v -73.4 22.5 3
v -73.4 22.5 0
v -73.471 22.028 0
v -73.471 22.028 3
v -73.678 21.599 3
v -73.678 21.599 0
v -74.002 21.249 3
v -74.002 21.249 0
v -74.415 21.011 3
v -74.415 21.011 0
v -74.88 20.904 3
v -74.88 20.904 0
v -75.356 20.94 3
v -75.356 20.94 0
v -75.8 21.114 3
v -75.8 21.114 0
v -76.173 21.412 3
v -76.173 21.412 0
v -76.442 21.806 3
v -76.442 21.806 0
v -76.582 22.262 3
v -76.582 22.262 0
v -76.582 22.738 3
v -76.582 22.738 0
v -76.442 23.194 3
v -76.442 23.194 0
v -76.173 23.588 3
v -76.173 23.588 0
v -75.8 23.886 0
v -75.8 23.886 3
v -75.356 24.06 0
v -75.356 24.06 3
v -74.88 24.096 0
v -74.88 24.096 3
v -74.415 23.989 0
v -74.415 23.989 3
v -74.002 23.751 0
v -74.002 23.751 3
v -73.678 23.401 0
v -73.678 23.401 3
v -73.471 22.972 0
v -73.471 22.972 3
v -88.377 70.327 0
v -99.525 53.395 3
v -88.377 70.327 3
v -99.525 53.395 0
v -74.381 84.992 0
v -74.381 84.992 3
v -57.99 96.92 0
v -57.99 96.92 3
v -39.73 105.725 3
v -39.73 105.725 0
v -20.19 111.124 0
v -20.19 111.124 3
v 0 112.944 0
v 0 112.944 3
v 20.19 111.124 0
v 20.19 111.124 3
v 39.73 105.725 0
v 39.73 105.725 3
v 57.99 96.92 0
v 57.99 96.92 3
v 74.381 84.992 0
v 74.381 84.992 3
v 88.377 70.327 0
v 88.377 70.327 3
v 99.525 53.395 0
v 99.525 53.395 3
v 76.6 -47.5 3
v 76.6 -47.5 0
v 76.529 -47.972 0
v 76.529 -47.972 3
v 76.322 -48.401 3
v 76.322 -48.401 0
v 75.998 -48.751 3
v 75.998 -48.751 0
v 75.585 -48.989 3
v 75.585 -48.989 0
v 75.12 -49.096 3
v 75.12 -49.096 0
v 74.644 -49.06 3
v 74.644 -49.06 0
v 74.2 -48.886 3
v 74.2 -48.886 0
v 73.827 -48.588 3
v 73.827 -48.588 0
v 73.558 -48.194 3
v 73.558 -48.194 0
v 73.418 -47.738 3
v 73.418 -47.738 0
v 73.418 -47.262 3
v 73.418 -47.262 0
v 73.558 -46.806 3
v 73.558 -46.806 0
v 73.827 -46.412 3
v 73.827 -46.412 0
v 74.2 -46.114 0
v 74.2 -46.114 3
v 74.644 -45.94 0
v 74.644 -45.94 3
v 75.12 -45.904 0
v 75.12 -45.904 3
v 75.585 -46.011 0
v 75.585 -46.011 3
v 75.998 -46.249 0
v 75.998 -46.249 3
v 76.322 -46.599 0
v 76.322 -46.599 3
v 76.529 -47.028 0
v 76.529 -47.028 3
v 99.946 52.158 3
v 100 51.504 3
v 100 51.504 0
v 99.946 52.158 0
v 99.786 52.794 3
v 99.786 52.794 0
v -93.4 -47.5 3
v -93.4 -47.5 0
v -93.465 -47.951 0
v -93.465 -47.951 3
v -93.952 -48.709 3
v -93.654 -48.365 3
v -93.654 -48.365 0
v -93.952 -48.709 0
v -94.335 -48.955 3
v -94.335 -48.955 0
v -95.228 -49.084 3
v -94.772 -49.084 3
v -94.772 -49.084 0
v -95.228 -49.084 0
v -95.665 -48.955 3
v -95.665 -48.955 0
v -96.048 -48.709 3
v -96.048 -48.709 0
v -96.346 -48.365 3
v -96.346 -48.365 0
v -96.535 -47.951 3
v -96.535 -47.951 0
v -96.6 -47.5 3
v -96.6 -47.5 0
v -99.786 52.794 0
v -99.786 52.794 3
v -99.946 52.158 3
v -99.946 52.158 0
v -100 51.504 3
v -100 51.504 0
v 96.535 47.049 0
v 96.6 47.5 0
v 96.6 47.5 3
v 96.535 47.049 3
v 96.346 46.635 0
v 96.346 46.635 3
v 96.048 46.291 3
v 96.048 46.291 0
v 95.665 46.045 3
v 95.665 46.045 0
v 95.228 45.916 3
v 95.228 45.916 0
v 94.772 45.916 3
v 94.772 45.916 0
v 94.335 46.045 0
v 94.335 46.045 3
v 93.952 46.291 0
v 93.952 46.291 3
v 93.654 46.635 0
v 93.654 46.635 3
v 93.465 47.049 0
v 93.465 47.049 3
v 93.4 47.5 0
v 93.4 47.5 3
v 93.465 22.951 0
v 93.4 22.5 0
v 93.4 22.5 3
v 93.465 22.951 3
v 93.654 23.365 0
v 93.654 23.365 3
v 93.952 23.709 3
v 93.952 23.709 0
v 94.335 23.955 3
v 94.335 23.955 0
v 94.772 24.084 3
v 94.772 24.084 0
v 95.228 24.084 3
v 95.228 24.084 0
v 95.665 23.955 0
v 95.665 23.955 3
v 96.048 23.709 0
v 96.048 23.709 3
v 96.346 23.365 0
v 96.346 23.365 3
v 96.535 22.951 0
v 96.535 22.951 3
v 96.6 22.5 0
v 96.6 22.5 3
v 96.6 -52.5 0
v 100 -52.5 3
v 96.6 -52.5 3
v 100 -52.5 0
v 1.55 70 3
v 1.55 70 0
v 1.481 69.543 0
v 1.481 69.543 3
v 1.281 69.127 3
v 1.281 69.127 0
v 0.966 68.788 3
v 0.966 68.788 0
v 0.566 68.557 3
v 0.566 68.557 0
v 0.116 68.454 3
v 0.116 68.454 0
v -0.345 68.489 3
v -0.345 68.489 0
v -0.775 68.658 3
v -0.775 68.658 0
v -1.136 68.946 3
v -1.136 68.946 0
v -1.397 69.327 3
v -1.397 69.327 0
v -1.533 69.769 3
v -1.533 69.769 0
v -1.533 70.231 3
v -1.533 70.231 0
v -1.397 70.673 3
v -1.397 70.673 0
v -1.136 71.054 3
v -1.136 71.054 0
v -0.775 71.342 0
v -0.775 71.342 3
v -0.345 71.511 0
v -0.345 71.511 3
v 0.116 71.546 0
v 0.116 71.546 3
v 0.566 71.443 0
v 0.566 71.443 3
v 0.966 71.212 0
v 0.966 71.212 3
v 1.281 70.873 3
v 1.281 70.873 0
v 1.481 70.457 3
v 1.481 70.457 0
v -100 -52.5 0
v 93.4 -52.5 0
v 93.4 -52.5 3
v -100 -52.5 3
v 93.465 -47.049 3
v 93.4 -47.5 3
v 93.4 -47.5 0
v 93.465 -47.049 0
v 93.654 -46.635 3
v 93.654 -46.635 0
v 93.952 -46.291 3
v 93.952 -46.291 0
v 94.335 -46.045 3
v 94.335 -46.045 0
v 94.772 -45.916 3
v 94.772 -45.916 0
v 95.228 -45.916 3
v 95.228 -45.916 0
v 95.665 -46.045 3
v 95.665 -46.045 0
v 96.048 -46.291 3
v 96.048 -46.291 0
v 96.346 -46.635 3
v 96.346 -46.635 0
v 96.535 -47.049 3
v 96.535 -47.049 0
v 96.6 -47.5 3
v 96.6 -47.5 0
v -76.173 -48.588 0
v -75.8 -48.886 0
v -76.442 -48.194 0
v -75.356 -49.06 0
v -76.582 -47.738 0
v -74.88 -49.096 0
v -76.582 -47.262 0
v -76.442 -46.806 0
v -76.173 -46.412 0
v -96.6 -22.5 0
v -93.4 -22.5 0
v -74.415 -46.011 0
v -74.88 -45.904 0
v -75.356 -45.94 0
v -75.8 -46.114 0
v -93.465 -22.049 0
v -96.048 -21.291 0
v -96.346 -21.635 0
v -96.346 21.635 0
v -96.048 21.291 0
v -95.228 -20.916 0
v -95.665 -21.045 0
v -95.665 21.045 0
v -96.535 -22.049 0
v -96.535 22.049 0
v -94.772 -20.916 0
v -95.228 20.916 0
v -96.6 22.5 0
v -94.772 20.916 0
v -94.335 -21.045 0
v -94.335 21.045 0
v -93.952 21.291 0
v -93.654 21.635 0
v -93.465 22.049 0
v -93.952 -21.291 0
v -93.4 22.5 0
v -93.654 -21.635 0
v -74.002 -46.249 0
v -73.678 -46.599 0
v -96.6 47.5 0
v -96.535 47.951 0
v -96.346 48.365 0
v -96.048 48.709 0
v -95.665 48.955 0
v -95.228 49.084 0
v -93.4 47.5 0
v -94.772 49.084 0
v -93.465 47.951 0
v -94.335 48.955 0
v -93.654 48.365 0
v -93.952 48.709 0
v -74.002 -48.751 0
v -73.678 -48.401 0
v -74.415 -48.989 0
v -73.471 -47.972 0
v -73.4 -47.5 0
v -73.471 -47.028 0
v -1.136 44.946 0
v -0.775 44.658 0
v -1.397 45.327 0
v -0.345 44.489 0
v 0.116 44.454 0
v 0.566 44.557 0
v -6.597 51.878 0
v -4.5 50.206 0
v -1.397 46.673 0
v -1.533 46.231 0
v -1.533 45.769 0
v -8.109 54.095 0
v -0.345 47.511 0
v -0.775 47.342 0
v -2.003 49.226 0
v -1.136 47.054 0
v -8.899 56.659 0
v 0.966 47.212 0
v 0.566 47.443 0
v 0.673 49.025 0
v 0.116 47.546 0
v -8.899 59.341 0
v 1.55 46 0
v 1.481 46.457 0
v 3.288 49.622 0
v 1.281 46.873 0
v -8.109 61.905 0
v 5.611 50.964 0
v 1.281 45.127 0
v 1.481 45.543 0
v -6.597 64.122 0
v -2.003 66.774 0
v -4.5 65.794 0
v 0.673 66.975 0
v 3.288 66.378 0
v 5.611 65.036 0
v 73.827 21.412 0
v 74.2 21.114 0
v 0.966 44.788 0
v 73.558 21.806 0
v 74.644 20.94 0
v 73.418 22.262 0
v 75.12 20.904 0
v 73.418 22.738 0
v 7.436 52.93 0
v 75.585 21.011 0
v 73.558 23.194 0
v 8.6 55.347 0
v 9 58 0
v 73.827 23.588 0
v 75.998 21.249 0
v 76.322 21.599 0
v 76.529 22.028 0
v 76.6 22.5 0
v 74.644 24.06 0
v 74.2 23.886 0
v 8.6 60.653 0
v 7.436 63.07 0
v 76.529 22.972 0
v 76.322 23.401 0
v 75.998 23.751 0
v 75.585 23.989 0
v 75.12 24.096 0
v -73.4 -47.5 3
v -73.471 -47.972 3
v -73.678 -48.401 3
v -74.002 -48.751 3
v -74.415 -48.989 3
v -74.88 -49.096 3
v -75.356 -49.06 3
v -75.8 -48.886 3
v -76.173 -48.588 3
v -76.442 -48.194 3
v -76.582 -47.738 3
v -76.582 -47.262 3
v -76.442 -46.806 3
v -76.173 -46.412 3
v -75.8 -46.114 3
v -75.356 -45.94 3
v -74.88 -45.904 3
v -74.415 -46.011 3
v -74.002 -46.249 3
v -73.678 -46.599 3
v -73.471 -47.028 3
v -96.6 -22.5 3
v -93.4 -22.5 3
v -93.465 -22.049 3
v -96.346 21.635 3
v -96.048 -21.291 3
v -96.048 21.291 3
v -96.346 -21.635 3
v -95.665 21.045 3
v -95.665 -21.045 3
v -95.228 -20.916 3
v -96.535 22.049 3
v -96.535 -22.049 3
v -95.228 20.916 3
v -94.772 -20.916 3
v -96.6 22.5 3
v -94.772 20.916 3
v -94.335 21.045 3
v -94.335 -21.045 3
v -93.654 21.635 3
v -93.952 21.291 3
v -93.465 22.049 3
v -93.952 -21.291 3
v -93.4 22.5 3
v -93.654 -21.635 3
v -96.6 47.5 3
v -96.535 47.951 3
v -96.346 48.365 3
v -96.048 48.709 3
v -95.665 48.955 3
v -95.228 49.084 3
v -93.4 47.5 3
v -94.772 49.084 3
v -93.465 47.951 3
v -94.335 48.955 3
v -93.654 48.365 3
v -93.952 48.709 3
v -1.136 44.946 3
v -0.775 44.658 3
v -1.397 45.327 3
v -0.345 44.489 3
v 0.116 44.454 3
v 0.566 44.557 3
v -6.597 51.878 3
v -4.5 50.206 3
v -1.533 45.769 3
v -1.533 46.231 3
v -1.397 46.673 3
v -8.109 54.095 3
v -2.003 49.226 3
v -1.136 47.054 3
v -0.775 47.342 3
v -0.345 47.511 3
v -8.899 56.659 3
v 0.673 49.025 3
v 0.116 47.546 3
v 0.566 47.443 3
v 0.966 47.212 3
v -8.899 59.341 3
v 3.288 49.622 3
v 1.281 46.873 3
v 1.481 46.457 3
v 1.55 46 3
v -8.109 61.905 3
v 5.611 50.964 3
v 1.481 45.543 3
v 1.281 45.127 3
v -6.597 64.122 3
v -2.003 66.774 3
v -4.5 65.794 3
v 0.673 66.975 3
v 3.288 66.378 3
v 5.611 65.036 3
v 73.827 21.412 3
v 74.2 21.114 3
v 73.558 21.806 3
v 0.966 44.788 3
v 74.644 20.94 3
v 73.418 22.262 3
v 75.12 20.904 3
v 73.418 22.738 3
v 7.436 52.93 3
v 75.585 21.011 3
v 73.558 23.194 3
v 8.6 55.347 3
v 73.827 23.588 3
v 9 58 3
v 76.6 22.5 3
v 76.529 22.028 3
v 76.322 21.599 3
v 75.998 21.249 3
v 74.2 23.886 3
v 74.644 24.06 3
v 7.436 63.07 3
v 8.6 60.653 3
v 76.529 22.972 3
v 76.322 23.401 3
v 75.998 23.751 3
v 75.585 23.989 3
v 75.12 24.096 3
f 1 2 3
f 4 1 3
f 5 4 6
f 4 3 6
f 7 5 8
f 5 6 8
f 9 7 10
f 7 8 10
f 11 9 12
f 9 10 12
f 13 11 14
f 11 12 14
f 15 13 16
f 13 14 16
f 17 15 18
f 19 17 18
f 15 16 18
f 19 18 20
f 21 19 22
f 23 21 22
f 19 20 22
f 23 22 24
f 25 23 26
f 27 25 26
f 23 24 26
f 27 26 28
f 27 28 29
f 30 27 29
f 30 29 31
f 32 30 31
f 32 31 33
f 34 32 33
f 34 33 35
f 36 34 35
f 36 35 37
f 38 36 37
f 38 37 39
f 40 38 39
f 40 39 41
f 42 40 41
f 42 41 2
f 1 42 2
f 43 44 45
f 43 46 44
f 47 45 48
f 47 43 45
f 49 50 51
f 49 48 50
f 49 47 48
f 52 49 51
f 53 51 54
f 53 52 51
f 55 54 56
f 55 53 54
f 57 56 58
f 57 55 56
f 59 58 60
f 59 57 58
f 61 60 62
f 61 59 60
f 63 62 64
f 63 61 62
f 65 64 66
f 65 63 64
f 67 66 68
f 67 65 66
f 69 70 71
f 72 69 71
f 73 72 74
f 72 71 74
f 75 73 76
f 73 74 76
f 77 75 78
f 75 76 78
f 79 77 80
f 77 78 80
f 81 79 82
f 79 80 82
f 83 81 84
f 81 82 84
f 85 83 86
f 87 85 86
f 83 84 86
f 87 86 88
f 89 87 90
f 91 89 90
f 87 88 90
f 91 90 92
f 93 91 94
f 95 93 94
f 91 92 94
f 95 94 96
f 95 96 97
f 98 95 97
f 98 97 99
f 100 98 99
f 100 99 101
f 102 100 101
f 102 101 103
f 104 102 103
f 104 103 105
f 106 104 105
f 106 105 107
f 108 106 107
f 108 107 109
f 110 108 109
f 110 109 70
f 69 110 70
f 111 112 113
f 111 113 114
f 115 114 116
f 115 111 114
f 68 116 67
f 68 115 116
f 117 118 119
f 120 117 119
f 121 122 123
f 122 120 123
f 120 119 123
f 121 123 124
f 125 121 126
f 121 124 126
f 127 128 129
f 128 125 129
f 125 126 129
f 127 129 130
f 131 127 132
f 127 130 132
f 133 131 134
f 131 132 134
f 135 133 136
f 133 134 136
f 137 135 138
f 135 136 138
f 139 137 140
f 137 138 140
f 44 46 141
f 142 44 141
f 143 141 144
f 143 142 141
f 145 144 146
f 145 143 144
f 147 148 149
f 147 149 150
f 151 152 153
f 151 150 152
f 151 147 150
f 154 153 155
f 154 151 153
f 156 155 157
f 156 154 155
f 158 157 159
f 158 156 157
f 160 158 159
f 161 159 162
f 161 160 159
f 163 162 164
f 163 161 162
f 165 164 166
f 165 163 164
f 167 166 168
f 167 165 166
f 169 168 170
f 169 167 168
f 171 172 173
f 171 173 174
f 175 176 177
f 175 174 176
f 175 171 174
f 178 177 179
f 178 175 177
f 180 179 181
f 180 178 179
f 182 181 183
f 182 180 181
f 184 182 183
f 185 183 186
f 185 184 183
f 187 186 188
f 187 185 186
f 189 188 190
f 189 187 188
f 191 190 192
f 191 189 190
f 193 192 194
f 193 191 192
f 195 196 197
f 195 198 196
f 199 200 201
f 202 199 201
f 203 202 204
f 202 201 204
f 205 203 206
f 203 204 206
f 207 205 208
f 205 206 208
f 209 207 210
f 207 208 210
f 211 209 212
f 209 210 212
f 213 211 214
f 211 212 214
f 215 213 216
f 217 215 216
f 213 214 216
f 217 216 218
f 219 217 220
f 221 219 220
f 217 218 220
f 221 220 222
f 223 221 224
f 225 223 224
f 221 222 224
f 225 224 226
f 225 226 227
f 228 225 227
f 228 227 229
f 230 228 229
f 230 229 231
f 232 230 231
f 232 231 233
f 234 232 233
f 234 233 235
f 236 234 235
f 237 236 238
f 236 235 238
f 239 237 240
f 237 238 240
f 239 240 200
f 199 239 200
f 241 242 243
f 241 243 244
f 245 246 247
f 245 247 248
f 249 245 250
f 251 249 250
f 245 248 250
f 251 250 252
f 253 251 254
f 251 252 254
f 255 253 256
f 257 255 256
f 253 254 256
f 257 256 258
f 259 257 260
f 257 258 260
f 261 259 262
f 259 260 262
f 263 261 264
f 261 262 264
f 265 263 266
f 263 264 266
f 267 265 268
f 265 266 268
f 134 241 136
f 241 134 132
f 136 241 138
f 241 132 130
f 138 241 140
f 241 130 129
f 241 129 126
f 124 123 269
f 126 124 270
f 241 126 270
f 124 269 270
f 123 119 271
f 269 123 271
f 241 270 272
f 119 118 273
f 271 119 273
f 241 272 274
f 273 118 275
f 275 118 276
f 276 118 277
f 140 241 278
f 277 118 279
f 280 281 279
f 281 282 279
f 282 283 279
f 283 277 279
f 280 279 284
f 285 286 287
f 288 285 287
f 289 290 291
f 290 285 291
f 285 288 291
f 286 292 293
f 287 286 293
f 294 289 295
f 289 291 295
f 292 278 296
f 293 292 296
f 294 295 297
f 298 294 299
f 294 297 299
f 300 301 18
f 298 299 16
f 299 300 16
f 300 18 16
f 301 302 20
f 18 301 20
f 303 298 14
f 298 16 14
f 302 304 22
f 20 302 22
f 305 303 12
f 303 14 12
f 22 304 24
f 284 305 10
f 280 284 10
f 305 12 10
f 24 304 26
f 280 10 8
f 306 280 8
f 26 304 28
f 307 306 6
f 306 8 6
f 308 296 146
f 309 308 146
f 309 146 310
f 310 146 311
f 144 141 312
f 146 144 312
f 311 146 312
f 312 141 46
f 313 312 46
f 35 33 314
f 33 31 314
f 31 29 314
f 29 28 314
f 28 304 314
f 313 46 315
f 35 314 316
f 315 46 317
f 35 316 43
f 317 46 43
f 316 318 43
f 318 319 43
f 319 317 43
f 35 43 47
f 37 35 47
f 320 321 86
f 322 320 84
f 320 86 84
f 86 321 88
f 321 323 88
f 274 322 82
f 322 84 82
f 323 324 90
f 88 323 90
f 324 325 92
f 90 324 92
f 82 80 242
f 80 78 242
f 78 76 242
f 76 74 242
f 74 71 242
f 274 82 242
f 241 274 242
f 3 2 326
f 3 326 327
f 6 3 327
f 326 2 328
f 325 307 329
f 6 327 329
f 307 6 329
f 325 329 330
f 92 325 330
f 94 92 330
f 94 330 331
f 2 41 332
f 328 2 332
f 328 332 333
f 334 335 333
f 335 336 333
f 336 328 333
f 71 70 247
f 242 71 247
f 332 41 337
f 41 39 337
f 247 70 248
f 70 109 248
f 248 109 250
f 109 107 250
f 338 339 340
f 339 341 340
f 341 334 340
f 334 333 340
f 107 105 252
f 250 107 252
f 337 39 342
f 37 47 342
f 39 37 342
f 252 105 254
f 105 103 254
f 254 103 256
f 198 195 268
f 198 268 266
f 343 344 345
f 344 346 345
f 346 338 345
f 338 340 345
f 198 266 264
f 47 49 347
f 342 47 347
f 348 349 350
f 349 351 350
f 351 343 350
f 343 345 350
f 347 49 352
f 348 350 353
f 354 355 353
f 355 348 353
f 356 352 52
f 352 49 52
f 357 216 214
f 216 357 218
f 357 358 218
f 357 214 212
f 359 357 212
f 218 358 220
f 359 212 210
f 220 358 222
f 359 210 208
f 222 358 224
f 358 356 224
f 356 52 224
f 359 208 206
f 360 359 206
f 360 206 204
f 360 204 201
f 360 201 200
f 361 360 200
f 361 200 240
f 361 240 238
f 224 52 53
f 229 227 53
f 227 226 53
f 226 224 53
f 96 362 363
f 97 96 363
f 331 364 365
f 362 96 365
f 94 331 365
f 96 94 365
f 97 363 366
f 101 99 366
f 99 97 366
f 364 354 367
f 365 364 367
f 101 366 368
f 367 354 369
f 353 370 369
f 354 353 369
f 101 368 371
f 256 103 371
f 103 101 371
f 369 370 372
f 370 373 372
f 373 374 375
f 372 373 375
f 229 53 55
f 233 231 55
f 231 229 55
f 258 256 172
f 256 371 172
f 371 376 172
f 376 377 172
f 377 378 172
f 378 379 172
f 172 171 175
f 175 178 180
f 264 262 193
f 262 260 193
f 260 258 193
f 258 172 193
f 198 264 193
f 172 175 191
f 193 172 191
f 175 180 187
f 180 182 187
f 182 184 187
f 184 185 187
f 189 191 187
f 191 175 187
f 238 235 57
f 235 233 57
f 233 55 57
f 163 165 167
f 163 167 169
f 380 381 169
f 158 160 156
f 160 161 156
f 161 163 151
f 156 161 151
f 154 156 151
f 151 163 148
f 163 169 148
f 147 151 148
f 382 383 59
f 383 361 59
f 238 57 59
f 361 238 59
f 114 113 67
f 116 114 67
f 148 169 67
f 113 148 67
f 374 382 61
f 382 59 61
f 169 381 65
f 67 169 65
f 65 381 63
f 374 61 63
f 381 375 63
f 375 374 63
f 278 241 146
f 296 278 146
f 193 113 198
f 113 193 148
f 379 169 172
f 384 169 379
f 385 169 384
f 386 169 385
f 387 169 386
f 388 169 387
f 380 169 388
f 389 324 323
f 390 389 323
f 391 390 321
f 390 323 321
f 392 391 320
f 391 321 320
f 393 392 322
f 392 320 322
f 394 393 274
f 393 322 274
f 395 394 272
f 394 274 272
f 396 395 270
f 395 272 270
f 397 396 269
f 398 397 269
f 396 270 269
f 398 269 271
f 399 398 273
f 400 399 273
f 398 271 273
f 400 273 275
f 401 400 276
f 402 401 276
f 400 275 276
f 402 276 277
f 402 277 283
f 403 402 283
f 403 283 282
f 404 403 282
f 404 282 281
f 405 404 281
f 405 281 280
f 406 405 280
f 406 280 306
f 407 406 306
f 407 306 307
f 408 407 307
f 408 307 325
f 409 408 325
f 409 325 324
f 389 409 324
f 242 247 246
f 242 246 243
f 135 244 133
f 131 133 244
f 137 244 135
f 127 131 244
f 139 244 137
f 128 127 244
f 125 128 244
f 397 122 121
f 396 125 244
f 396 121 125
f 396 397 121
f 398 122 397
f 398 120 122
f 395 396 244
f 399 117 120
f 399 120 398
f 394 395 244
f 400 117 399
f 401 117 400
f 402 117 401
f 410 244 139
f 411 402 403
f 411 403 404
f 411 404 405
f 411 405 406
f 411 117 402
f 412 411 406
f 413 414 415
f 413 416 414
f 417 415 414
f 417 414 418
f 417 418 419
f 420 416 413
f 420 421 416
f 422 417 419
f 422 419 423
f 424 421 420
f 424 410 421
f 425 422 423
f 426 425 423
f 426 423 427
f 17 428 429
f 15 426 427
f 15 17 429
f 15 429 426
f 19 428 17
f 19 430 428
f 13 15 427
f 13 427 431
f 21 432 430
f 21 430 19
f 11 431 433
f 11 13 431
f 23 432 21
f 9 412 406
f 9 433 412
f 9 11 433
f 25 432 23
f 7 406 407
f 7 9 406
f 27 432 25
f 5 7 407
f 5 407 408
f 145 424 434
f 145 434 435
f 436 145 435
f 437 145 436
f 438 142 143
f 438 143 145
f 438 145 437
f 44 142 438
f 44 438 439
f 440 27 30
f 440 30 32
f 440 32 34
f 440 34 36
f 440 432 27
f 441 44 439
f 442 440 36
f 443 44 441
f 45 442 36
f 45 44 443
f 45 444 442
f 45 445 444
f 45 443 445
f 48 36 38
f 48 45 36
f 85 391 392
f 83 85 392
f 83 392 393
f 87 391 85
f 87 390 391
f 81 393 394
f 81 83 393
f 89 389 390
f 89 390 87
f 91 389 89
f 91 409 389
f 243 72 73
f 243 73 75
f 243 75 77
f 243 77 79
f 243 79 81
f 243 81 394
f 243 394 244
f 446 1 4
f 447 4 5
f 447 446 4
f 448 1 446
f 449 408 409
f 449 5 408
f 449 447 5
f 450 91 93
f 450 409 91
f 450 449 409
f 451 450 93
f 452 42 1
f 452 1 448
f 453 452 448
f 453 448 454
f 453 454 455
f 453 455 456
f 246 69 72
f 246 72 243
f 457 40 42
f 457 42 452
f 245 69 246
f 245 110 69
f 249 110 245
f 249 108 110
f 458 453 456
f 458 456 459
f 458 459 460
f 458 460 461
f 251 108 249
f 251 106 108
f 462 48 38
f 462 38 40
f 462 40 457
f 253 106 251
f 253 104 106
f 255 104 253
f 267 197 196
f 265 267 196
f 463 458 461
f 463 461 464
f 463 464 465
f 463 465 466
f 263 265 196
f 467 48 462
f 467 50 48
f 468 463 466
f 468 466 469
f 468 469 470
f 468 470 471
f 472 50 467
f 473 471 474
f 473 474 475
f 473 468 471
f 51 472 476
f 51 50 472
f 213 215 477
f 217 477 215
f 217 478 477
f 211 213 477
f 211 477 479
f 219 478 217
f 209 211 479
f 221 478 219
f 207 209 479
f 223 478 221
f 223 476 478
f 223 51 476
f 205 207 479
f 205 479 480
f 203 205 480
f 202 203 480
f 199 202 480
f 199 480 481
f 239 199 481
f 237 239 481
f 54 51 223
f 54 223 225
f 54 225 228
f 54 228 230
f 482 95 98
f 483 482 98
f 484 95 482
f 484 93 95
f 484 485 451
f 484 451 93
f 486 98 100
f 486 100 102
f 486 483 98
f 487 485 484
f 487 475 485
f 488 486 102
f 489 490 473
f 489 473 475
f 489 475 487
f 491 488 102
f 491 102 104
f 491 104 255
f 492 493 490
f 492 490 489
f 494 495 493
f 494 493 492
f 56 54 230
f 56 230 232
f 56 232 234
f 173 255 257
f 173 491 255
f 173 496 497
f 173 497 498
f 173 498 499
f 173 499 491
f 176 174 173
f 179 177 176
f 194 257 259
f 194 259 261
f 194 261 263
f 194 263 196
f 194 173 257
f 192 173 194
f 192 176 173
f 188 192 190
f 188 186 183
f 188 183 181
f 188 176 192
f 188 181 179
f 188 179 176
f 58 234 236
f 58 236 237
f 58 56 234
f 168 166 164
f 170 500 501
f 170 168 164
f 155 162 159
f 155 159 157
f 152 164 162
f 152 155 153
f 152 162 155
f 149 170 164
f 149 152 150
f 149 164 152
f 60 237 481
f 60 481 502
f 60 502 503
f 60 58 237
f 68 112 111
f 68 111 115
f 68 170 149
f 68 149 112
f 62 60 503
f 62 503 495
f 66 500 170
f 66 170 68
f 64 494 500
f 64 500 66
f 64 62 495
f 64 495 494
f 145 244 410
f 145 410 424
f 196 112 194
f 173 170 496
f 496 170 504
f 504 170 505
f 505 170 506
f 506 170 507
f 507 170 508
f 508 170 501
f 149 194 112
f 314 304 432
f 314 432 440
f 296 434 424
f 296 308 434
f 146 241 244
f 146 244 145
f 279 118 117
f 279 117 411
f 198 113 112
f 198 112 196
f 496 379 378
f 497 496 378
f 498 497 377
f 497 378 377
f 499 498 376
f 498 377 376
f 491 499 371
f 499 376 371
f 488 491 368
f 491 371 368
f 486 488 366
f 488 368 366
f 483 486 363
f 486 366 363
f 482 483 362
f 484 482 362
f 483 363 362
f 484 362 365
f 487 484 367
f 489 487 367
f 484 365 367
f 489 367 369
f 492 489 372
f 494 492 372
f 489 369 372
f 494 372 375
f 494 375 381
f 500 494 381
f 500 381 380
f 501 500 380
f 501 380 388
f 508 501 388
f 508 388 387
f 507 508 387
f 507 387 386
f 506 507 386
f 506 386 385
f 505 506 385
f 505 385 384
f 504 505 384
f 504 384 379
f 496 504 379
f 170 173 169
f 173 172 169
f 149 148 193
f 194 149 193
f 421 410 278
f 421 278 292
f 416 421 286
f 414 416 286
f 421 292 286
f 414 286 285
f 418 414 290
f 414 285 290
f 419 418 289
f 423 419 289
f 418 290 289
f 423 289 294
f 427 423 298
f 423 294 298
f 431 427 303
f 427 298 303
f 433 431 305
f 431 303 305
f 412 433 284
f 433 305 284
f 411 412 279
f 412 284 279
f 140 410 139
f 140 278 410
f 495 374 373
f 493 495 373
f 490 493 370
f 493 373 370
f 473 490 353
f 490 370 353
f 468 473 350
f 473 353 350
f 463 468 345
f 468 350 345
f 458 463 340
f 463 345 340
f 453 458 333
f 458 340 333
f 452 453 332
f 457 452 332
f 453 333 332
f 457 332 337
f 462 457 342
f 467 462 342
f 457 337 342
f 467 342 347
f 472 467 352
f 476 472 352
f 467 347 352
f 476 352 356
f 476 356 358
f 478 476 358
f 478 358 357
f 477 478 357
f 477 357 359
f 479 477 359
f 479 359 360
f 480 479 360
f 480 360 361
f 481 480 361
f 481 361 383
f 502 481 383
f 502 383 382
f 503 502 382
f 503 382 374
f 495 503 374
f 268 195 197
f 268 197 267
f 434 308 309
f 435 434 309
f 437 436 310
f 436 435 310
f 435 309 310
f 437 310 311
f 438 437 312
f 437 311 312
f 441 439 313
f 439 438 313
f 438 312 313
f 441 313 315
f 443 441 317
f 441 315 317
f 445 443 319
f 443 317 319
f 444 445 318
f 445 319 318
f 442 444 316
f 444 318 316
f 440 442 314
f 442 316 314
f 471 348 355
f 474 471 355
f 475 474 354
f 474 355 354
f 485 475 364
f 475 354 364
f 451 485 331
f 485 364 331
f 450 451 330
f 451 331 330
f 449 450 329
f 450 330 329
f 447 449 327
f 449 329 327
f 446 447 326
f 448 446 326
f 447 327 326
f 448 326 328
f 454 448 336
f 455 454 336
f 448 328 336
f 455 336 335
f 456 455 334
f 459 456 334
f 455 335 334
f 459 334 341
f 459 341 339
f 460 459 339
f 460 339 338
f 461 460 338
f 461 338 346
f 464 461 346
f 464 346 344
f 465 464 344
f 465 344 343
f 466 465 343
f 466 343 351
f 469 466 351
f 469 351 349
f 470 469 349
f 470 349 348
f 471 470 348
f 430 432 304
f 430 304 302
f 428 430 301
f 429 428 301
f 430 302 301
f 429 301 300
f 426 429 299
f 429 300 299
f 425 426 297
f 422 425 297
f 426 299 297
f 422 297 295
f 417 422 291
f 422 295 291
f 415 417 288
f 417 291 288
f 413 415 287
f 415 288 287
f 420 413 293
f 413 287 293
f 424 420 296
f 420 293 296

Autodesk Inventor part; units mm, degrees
ref_plane "YZ Plane" through (0, 0, 0) normal (1, 0, 0) x (0, 1, 0)
ref_plane "XZ Plane" through (0, 0, 0) normal (0, 1, 0) x (-1, 0, 0)
ref_plane "XY Plane" through (0, 0, 0) normal (0, 0, 1) x (1, 0, 0)
sketch "スケッチ1" plane through (0, 0, 0) normal (0, 0, 1) x (1, 0, 0)
  point P0 (0, 0)
sketch "スケッチ2" plane through (0, 0, 0) normal (0, 0, 1) x (1, 0, 0)
  line L0 (100, -52.5) -> (-100, -52.5)
  line L1 (-100, -52.5) -> (-100, 52.5)
  line L2 (-100, 52.5) -> (100, 52.5)
  line L3 (100, 52.5) -> (100, -52.5)
  line L4 (100, -52.5) -> (-100, 52.5) construction
  line L5 (-100, -52.5) -> (100, 52.5) construction
  circle A0 centre (-48, -32) radius 6.05
  circle A1 centre (48, -32) radius 12.55
  circle A2 centre (48, -32) radius 17.5
  circle A3 centre (65.5, -32) radius 2.05
  circle A4 centre (48, -14.5) radius 2.05
  circle A5 centre (30.5, -32) radius 2.05
  circle A6 centre (48, -49.5) radius 2.05
  circle A7 centre (-48, -32) radius 9
  circle A8 centre (-57, -32) radius 1.6
  circle A9 centre (-48, -41) radius 1.6
  circle A10 centre (-39, -32) radius 1.6
  circle A11 centre (-48, -23) radius 1.6
  line L6 (95, 47.5) -> (-95, 47.5)
  line L7 (-95, 47.5) -> (-95, -47.5)
  line L8 (-95, -47.5) -> (95, -47.5)
  line L9 (95, -47.5) -> (95, 47.5)
  line L10 (-95, 47.5) -> (-95, 22.5) construction
  line L11 (-96.6, 47.5) -> (-96.6, 22.5)
  line L12 (-93.4, 22.5) -> (-93.4, 47.5)
  arc A12 (-93.4, 47.5) -> (-96.6, 47.5) centre (-95, 47.5) ccw
  arc A13 (-96.6, 22.5) -> (-93.4, 22.5) centre (-95, 22.5) ccw
  line L13 (-95, 47.5) -> (-70, 47.5) construction
  line L14 (-95, -47.5) -> (-95, -22.5) construction
  line L15 (-93.4, -47.5) -> (-93.4, -22.5)
  line L16 (-96.6, -22.5) -> (-96.6, -47.5)
  arc A14 (-96.6, -47.5) -> (-93.4, -47.5) centre (-95, -47.5) ccw
  arc A15 (-93.4, -22.5) -> (-96.6, -22.5) centre (-95, -22.5) ccw
  line L17 (-95, -47.5) -> (-70, -47.5) construction
  line L18 (95, 47.5) -> (95, 22.5) construction
  line L19 (96.6, 47.5) -> (96.6, 22.5)
  line L20 (93.4, 22.5) -> (93.4, 47.5)
  arc A16 (93.4, 47.5) -> (96.6, 47.5) centre (95, 47.5) ccw
  arc A17 (96.6, 22.5) -> (93.4, 22.5) centre (95, 22.5) ccw
  line L21 (95, 47.5) -> (120, 47.5) construction
  line L22 (95, -47.5) -> (95, -72.5) construction
  line L23 (93.4, -47.5) -> (93.4, -72.5)
  line L24 (96.6, -72.5) -> (96.6, -47.5)
  arc A18 (96.6, -47.5) -> (93.4, -47.5) centre (95, -47.5) ccw
  arc A19 (93.4, -72.5) -> (96.6, -72.5) centre (95, -72.5) ccw
  line L25 (95, -47.5) -> (120, -47.5) construction
  line L26 (-100, -32) -> (100, -32)
  circle A20 centre (0, -32) radius 9
  circle A21 centre (0, -32) radius 39
  line L27 (-85, 52.5) -> (85, 52.5)
  line L28 (85, 52.5) -> (85, 47.5)
  line L29 (85, 47.5) -> (-85, 47.5)
  line L30 (-85, 47.5) -> (-85, 52.5)
  line L31 (-85, 47.5) -> (0, 0)
  line L32 (0, 0) -> (85, 47.5)
  line L33 (-100, 0) -> (100, 0)
  line L34 (100, 0) -> (100, -62.5)
  line L35 (100, -62.5) -> (-100, -62.5)
  line L36 (-100, -62.5) -> (-100, 0)
  arc A22 (100, 52.5) -> (-100, 52.5) centre (0, 0) ccw
  circle A23 centre (0, 58) radius 12
  line L37 (0, 112.9436) -> (0, -32)
  circle A24 centre (0, 58) radius 9
  circle A25 centre (0, 70) radius 1.55
  circle A26 centre (0, 46) radius 1.55
  line L38 (75, -47.5) -> (-75, -47.5)
  line L39 (-75, -47.5) -> (-75, 22.5)
  line L40 (-75, 22.5) -> (75, 22.5)
  line L41 (75, 22.5) -> (75, -47.5)
  line L42 (75, -47.5) -> (-75, 22.5) construction
  line L43 (-75, -47.5) -> (75, 22.5) construction
  circle A27 centre (-75, 22.5) radius 1.6
  circle A28 centre (75, 22.5) radius 1.6
  circle A29 centre (75, -47.5) radius 1.6
  circle A30 centre (-75, -47.5) radius 1.6
  point P0 (-95, 35)
  point P1 (-95, -35)
  point P2 (95, 35)
  point P3 (95, -60)
  point P4 (-39.1422, -33.5937)
  point P5 (-39.1422, -30.4063)
  point P6 (0, 52.5)
  point P7 (85, 52.5)
  point P8 (48.45, -47.5)
  point P9 (47.55, -47.5)
  point P10 (100, -52.5)
  point P11 (0, -12.5)
  dimension "d9" = 35
  dimension "d15" = 18
  dimension "d0" = 200
  dimension "d1" = 105
  dimension "d5" = 12.1
  dimension "d6" = 25.1
  dimension "d10" = 4.1
  dimension "d13" = 360
  dimension "d16" = 3.2
  dimension "d19" = 360
  dimension "d21" = 5
  dimension "d22" = 25
  dimension "d23" = 90
  dimension "d24" = 3.2
  dimension "d25" = 25
  dimension "d26" = 90
  dimension "d27" = 3.2
  dimension "d28" = 25
  dimension "d29" = 90
  dimension "d30" = 3.2
  dimension "d31" = 25
  dimension "d32" = 90
  dimension "d33" = 3.2
  dimension "d36" = 20.5
  dimension "d37" = 18
  dimension "d38" = 78
  dimension "d39" = 48
  dimension "d40" = 48
  dimension "d43" = 170
  dimension "d44" = 85
  dimension "d46" = 62.5
  dimension "d47" = 24
  dimension "d48" = 90
  dimension "d49" = 18
  dimension "d50" = 3.1
  dimension "d51" = 3.1
  dimension "d52" = 150
  dimension "d53" = 70
  dimension "d54" = 3.2
  dimension "d55" = 3.2
  dimension "d56" = 3.2
  dimension "d57" = 3.2
  dimension "d62" = 105.5
extrude "押し出し1" add sketch "スケッチ2" along normal blind 3 contours L0 L24 A18 L9 L26 L3 | L26 L9 L33 L3 | L0 A21 L8 A2 A6 A29 L23 | L33 L9 A17 L19 A16 L6 L28 L2 L3 | L26 L41 L33 L9 | L9 A18 L8 A29 L41 L26 | L0 A21 L8 | L2 A23 A25 L37 A22 | L33 L41 A28 L40 L32 L6 L20 A17 L9 | L41 A29 L8 A2 A3 L26 | L26 A3 A2 A4 A21 L33 L41 | L0 L1 L26 L16 A14 L8 A30 A21 | A21 A2 L8 | L8 A21 A10 L26 A20 A5 A2 | L28 L6 A23 L2 | L37 A25 A23 L2 A22 | L33 A21 L32 L40 A28 L41 | L26 A2 A3 | A3 A2 L26 | L8 A30 L39 L26 A8 A7 A9 A10 A21 | L8 A6 A2 | A2 A21 A1 L26 A3 L8 A6 | A2 A5 L26 A1 A21 | A23 L6 A26 L37 A24 L2 | L2 A24 L37 A25 A23 | L32 L40 L37 A26 A23 L6 | L2 L30 L6 A12 L11 A13 L7 L33 L1 | A16 L6 L9 | L33 L32 A21 | A21 A2 A5 L26 A20 L37 L33 | A3 L26 A1 A21 A2 A4 | A2 L26 A3 | A3 L26 A2 | L1 L33 L7 A15 L16 L26 | A21 L26 A10 | A10 A7 A21 | A6 L8 A2 | A2 A6 | A6 L8 | A5 L26 A2 | A2 L26 A5 | A21 L26 A1 | A1 L26 A21 | A2 A6 L8 | A23 A26 L6 | L32 A21 L37 L40 | L2 A23 L6 L30 | A25 L37 A24 L2 A23 | A21 A1 L26 A5 A2 | L32 L37 A21 | L33 A21 L31 | L37 A20 L26 A10 A21 L33 | L31 A21 L37 | A4 A2 | A2 A4 | A30 L8 L15 L26 L39 | A10 L26 A7 | A7 A9 A8 L26 A0 A10 | L26 A21 A10 | L26 A10 A7 | A7 A10 A21 | L26 A5 A2 | A2 A5 L26 | A1 A21 L26 | L26 A21 A1 | L37 A26 L6 A23 L2 A24 | L40 L31 L6 A23 A26 L37 | L37 A21 L31 L40 | L33 L39 L26 L15 A15 L7 | L7 A13 L12 L6 L31 L40 A27 L39 L33 | A21 L33 L39 A27 L40 L31 | A21 A10 A7 A11 A8 L26 L39 L33 | L37 L26 A20 | A20 L26 L37 | A9 A7 | A7 A9 | L26 A0 A8 A7 A11 A10 | L26 A20 | L6 A26 A23 | L26 A7 A8 | A8 A7 L26 | L26 A0 | A0 L26 | A11 A7 | A7 A11 | A8 L26 A7 | A7 L26 A8
fillet "フィレット1" radius 4 2 edges at (100, 52.5, 1.5) (-100, 52.5, 1.5)
equation "\"d25\" = d22"
equation "\"d27\" = d24"
equation "\"d28\" = d22"
equation "\"d30\" = d24"
equation "\"d31\" = d22"
equation "\"d33\" = d24"
equation "\"d40\" = d39"
equation "\"d44\" = 0.5 * d43"
properties part number "aaa_small_plate_arm"
